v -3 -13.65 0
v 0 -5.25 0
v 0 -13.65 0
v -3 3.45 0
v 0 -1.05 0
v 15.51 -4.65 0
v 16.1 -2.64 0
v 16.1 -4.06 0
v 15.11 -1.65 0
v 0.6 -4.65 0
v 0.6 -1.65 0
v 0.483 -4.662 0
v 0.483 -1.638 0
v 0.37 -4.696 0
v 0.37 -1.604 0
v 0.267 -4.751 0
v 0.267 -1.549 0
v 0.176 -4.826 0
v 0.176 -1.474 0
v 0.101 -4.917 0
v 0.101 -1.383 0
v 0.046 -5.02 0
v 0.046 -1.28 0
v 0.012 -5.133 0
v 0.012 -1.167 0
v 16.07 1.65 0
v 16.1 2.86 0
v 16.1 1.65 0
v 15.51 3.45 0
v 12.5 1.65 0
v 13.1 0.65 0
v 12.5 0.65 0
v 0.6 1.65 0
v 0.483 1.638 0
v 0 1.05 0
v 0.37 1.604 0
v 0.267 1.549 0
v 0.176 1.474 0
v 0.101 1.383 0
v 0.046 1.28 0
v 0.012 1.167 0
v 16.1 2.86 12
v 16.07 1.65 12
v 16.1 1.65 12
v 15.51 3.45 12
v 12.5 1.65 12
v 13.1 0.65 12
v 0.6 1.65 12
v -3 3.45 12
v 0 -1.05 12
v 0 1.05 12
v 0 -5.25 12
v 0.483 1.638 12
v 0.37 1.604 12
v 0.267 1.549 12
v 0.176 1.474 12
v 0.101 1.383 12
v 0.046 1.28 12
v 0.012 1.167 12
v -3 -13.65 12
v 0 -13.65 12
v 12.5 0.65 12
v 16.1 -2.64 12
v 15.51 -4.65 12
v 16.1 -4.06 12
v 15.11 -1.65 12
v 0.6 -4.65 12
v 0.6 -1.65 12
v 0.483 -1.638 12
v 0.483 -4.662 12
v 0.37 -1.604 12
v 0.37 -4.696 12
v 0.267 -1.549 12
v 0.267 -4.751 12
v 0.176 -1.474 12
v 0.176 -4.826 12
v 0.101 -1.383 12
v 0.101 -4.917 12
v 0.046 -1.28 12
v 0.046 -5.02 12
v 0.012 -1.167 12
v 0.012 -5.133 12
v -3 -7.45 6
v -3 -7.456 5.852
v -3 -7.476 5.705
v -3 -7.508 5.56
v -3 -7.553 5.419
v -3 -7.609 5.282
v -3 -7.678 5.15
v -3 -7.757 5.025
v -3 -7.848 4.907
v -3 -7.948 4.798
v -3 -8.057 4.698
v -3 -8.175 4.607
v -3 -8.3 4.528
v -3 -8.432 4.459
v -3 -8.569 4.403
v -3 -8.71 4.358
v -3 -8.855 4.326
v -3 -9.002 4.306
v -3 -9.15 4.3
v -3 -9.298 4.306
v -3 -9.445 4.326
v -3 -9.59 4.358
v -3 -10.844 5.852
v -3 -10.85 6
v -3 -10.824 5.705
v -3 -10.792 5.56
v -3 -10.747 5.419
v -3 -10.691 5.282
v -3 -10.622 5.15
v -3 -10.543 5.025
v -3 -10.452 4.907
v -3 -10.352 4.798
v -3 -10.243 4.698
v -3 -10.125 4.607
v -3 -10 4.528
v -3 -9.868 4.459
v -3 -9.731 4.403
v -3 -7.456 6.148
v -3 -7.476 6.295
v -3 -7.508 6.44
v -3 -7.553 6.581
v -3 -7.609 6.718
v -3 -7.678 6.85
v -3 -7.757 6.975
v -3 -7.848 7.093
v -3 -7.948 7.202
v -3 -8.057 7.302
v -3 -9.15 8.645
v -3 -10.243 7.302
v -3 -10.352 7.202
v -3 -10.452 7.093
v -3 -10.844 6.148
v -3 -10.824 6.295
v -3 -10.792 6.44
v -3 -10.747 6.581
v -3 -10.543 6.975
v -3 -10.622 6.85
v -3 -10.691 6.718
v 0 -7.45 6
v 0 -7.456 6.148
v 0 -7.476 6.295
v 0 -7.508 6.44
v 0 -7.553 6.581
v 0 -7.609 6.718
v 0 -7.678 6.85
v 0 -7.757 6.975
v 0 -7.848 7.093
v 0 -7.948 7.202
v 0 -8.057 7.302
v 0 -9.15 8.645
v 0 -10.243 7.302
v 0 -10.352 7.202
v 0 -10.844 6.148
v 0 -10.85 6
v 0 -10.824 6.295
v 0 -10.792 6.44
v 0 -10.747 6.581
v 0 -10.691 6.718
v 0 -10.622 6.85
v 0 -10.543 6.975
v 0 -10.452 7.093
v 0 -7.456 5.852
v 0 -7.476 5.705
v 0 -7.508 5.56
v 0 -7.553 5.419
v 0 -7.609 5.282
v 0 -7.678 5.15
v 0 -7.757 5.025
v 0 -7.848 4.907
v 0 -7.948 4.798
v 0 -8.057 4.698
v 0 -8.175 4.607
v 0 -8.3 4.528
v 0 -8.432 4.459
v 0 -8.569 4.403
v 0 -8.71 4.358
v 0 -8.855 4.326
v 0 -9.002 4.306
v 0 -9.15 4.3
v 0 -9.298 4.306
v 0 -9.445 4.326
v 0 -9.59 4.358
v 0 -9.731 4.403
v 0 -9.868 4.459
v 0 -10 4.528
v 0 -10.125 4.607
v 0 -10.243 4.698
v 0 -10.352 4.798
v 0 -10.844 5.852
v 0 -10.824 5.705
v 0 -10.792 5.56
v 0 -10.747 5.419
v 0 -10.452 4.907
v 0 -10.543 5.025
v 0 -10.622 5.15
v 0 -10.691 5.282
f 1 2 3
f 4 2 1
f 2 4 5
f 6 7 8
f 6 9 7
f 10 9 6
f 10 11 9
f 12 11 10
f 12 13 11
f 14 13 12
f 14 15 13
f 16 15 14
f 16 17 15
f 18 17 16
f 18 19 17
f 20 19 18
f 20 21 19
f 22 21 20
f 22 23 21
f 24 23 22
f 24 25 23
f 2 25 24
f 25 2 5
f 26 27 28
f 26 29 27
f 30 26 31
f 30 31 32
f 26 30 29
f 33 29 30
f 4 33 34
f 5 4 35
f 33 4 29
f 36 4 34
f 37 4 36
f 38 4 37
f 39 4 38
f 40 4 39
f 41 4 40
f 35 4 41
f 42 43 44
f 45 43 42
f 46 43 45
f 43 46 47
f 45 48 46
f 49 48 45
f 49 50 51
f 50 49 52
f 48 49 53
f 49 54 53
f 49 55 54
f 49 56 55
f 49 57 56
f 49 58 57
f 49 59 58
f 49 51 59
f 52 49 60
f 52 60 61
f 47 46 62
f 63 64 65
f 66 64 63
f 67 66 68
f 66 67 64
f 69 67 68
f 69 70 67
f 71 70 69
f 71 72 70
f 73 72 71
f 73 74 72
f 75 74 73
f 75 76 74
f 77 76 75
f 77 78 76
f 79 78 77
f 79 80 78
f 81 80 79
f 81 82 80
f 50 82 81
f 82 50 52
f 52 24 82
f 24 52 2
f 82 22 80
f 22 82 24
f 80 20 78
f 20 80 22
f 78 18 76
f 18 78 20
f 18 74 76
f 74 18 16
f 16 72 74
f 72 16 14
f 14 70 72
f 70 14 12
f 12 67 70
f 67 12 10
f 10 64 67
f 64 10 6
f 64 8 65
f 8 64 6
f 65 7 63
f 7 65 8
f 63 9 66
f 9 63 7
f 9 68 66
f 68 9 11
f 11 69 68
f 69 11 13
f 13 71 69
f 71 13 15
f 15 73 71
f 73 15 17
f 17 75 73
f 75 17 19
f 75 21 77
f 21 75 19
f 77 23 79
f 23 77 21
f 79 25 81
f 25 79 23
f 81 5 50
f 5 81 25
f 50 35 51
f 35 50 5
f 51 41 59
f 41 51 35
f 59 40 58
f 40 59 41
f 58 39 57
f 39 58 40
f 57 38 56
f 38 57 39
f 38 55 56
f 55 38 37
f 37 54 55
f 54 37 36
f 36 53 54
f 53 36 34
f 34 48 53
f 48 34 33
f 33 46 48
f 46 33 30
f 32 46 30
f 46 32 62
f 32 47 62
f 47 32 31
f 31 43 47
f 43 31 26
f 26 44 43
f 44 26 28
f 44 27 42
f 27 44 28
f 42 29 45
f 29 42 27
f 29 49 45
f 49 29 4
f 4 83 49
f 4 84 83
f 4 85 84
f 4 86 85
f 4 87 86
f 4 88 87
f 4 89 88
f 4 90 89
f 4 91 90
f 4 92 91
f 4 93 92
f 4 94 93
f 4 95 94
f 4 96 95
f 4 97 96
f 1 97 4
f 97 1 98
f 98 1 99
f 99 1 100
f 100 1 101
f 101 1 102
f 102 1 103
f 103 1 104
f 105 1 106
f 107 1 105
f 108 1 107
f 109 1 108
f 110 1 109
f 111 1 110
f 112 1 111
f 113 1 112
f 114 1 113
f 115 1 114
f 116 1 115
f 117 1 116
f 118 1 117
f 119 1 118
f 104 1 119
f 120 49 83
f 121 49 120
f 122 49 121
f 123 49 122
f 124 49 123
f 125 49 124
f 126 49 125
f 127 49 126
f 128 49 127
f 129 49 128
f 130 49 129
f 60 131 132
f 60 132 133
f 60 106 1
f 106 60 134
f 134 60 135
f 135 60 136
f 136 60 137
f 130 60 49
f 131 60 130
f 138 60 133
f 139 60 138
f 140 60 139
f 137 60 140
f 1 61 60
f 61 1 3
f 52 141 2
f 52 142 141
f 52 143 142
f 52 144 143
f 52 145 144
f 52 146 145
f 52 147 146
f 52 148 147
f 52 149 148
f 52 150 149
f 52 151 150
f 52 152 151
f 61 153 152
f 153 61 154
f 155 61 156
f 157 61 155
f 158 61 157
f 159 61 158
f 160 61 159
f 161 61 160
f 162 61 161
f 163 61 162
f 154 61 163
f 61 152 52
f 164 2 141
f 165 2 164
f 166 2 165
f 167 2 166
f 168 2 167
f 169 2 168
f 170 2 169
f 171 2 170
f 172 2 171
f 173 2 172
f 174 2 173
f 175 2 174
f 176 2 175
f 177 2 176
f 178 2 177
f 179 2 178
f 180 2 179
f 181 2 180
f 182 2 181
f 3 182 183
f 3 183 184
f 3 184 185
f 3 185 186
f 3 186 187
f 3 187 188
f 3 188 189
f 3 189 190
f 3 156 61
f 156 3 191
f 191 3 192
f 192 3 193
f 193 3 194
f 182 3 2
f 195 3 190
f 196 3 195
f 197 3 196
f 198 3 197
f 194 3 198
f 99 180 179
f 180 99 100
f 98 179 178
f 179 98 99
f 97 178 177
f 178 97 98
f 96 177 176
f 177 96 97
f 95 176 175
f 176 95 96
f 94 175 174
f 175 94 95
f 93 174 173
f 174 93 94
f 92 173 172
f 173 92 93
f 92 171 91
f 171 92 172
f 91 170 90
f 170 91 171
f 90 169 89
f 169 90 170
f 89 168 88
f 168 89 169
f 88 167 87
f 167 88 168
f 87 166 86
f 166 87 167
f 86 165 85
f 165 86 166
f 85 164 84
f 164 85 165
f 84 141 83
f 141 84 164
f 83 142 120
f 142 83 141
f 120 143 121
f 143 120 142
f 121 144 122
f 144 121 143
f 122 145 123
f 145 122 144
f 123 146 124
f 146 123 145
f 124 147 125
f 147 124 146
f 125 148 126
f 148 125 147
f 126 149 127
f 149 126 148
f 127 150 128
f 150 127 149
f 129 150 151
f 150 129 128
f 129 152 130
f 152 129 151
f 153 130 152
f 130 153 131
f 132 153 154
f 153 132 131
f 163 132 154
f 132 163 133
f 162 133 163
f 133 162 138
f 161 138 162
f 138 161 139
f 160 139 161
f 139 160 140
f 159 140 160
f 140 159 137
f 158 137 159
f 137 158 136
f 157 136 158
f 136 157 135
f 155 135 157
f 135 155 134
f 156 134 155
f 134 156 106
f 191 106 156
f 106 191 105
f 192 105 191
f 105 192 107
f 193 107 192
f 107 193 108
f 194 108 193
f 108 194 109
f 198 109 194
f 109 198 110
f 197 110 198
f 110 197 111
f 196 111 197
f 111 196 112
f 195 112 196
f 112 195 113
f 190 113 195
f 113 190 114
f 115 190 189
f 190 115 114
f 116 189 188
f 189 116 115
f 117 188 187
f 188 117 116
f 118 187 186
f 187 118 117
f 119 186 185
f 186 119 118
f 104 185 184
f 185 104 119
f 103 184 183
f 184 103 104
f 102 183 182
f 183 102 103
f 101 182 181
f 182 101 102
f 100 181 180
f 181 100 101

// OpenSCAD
// TEMPLATE: cantilever snap-fit edge clip — a U channel that snaps over the edge of a rail / panel of given thickness; rigid jaw, flexing arm with a barb, lead-in chamfers, root fillets, and a mounting ear with a screw hole
// Interfaces: rail_slot (slot width = rail_t + clearance, along Y; the rail edge enters along -X and seats on the floor x = 0) and mount_hole (screw through the ear, along X).
// Origin: slot floor (back plate inner face) at x = 0, slot centred on y = 0, bottom of the extrusion on z = 0.
// The rail seats against the floor between the root fillets (its corners ride ~0.2 mm up them); catch_gap covers that.
// Print orientation: STANDING, the U profile flat on the bed and extruded up Z (the clip's length along the rail). The arm then bends
// within the layer plane, so the flex stress runs along the layers instead of prying them apart. No overhangs: the screw hole is a teardrop.
// Beam rule (straight cantilever, uniform section): deflection y = eps * L^2 / (1.5 * h)  ->  L_min = sqrt(1.5 * h * y / eps).

/* [Interface] */
rail_t = 3.0;            // [1:0.1:12]  rail / panel thickness
clearance = 0.3;         // [0:0.05:0.8]  added to the slot width
rail_w = 12;             // [5:0.5:40]  how far the rail edge goes into the clip (slot depth to the barb)
screw_d = 3.0;           // [2:0.1:6]  mounting screw diameter (M3 = 3.0)
hole_clearance = 0.4;    // [0:0.05:1]

/* [Snap] */
arm_t = 1.8;             // [1.2:0.1:4]  flexing arm thickness (h)
catch = 1.0;             // [0.4:0.1:3]  barb height = arm tip deflection (y)
catch_angle = 90;        // [45:5:90]  retaining face angle; 90 = permanent hook, 45 = releasable
barb_len = 3;            // [1.5:0.25:8]  lead-in ramp length
barb_flat = 0.6;         // [0:0.1:2]
catch_gap = 0.5;         // [0:0.05:1]  gap between the rail edge and the retaining face (the rail corners ride ~0.2 mm up the root fillets)
max_strain = 0.03;       // [0.01:0.005:0.06]  allowable strain (PETG ~0.03, PLA ~0.02, nylon ~0.05)
modulus_mpa = 2000;      // [1000:100:4000]  flexural modulus, for the insertion-force estimate only

/* [Body] */
depth = 12;              // [6:1:40]  clip length along the rail (extrusion, Z)
jaw_t = 3;               // [2:0.25:8]  rigid jaw thickness
base_t = 3;              // [2:0.25:8]  back plate / ear thickness
ear_w = 9;               // [6:0.5:20]  mounting ear width (beyond the rigid jaw)
root_fillet = 0.6;       // [0:0.1:2]  fillets in the slot floor corners (arm root) and at the ear; a sharp-cornered rail seats r*(1-cos45°) off the floor
lead_in = 1;             // [0.4:0.1:2]  chamfer on the rigid jaw's inner tip (guides the rail in)

/* [Render] */
render_target = "part";  // [part, coupon, assembly]

/* [Hidden] */
$fn = 96;
w = rail_t + clearance;                       // slot width
hole = screw_d + hole_clearance;
xb = rail_w + catch_gap;                      // retaining face
tip_x = xb + barb_flat + barb_len + catch / tan(catch_angle);
arm_len = xb;                                 // effective cantilever length (root plane x = 0 to the retaining face)
arm_len_min = sqrt(1.5 * arm_t * catch / max_strain);
insertion_force_n = depth * arm_t * arm_t * modulus_mpa * max_strain / (6 * arm_len);
y_ear = -(w / 2 + jaw_t + ear_w / 2);
opening = w - catch;

assert(arm_len >= arm_len_min, str("arm too short for the catch: rail_w + catch_gap must be >= ", arm_len_min, " mm (or lower catch / thinner arm)"));
assert(opening > 0.5, "barb closes the slot; reduce catch");
assert(arm_t >= 1.2, "arm thinner than 1.2 mm will not print reliably");
assert(ear_w >= hole + 3.2, "ear too narrow for the screw hole with 1.6 mm walls");
assert(depth >= hole / sin(40) + 3.2, "clip too short (Z) for the screw hole");
echo(slot_width = w, opening_at_tips = opening, arm_len = arm_len, arm_len_min = arm_len_min, insertion_force_n = insertion_force_n, hole = hole, ear_centre_y = y_ear);

module teardrop2d(d, ang = 50, n = 56) {
    r = d / 2;
    sweep = 360 - 2 * (90 - ang);
    polygon(concat([for (i = [0 : n]) let(a = ang - i * sweep / n) [r * cos(a), r * sin(a)]], [[0, r / sin(90 - ang)]]));
}

module fillet2d(r) { difference() { square([r, r]); translate([r, r]) circle(r = r, $fn = 32); } }

// U profile in the XY plane
module profile2d() {
    union() {
        translate([-base_t, y_ear - ear_w / 2]) square([base_t, ear_w + jaw_t + w + arm_t]);                // back plate + ear
        translate([-base_t, -w / 2 - jaw_t]) square([tip_x + base_t, jaw_t]);                              // rigid jaw
        translate([-base_t, w / 2]) square([tip_x + base_t, arm_t]);                                       // arm
        // barb on the arm's inner face: retaining face, flat, lead-in ramp
        polygon([[xb, w / 2 + 0.01], [xb + catch / tan(catch_angle), w / 2 - catch], [xb + catch / tan(catch_angle) + barb_flat, w / 2 - catch], [tip_x, w / 2 + 0.01]]);
        if (root_fillet > 0) {
            translate([0, w / 2]) mirror([0, 1]) fillet2d(root_fillet);                                  // arm root
            translate([0, -w / 2]) fillet2d(root_fillet);                                                // rigid jaw root
            translate([0, -w / 2 - jaw_t]) mirror([0, 1]) fillet2d(root_fillet);                         // ear / jaw corner
        }
    }
}

module tip_chamfers2d() {
    // lead-in on the rigid jaw's inner tip; small chamfers on both outer tips
    translate([tip_x, -w / 2]) polygon([[0.01, -lead_in], [0.01, 0.01], [-lead_in, 0.01]]);
    translate([tip_x, -w / 2 - jaw_t]) polygon([[0.01, 0.6], [0.01, -0.01], [-0.6, -0.01]]);
    translate([tip_x, w / 2 + arm_t]) polygon([[0.01, -0.6], [0.01, 0.01], [-0.6, 0.01]]);
}

module mount_hole() {
    translate([-base_t - 1, y_ear, depth / 2]) rotate([90, 0, 90]) linear_extrude(height = base_t + 2) teardrop2d(hole);
}

module part() {
    difference() {
        linear_extrude(height = depth) difference() { profile2d(); tip_chamfers2d(); }
        mount_hole();
    }
}

module coupon() {
    // slot ladder: a comb with three plain slots at clearance -0.2 / 0 / +0.2 (no barb), printed standing like the part
    pitch = w + 6;
    difference() {
        union() {
            translate([-base_t, -pitch * 1.5 - 1, 0]) cube([base_t + 8, 3 * pitch + 2, depth]);
            for (i = [-1, 0, 1]) translate([-base_t, i * pitch, depth - 3]) rotate([90, 0, -90]) linear_extrude(0.6) text(str(i * 0.2), size = 2.2, halign = "center", valign = "center", $fn = 16);
        }
        for (i = [-1, 0, 1]) translate([0, i * pitch - (w + i * 0.2) / 2, -1]) cube([9, w + i * 0.2, depth + 2]);
    }
}

module assembly() {
    part();
    %translate([0, -rail_t / 2, -5]) cube([rail_w, rail_t, depth + 10]);                  // the rail edge, seated
    %translate([-base_t - 4, y_ear - ear_w / 2 - 6, -6]) cube([4, ear_w + 26, depth + 12]); // the wall
    %translate([-base_t - 6, y_ear, depth / 2]) rotate([0, 90, 0]) cylinder(d = screw_d, h = base_t + 8);
}

if (render_target == "part") part();
else if (render_target == "coupon") coupon();
else assembly();
